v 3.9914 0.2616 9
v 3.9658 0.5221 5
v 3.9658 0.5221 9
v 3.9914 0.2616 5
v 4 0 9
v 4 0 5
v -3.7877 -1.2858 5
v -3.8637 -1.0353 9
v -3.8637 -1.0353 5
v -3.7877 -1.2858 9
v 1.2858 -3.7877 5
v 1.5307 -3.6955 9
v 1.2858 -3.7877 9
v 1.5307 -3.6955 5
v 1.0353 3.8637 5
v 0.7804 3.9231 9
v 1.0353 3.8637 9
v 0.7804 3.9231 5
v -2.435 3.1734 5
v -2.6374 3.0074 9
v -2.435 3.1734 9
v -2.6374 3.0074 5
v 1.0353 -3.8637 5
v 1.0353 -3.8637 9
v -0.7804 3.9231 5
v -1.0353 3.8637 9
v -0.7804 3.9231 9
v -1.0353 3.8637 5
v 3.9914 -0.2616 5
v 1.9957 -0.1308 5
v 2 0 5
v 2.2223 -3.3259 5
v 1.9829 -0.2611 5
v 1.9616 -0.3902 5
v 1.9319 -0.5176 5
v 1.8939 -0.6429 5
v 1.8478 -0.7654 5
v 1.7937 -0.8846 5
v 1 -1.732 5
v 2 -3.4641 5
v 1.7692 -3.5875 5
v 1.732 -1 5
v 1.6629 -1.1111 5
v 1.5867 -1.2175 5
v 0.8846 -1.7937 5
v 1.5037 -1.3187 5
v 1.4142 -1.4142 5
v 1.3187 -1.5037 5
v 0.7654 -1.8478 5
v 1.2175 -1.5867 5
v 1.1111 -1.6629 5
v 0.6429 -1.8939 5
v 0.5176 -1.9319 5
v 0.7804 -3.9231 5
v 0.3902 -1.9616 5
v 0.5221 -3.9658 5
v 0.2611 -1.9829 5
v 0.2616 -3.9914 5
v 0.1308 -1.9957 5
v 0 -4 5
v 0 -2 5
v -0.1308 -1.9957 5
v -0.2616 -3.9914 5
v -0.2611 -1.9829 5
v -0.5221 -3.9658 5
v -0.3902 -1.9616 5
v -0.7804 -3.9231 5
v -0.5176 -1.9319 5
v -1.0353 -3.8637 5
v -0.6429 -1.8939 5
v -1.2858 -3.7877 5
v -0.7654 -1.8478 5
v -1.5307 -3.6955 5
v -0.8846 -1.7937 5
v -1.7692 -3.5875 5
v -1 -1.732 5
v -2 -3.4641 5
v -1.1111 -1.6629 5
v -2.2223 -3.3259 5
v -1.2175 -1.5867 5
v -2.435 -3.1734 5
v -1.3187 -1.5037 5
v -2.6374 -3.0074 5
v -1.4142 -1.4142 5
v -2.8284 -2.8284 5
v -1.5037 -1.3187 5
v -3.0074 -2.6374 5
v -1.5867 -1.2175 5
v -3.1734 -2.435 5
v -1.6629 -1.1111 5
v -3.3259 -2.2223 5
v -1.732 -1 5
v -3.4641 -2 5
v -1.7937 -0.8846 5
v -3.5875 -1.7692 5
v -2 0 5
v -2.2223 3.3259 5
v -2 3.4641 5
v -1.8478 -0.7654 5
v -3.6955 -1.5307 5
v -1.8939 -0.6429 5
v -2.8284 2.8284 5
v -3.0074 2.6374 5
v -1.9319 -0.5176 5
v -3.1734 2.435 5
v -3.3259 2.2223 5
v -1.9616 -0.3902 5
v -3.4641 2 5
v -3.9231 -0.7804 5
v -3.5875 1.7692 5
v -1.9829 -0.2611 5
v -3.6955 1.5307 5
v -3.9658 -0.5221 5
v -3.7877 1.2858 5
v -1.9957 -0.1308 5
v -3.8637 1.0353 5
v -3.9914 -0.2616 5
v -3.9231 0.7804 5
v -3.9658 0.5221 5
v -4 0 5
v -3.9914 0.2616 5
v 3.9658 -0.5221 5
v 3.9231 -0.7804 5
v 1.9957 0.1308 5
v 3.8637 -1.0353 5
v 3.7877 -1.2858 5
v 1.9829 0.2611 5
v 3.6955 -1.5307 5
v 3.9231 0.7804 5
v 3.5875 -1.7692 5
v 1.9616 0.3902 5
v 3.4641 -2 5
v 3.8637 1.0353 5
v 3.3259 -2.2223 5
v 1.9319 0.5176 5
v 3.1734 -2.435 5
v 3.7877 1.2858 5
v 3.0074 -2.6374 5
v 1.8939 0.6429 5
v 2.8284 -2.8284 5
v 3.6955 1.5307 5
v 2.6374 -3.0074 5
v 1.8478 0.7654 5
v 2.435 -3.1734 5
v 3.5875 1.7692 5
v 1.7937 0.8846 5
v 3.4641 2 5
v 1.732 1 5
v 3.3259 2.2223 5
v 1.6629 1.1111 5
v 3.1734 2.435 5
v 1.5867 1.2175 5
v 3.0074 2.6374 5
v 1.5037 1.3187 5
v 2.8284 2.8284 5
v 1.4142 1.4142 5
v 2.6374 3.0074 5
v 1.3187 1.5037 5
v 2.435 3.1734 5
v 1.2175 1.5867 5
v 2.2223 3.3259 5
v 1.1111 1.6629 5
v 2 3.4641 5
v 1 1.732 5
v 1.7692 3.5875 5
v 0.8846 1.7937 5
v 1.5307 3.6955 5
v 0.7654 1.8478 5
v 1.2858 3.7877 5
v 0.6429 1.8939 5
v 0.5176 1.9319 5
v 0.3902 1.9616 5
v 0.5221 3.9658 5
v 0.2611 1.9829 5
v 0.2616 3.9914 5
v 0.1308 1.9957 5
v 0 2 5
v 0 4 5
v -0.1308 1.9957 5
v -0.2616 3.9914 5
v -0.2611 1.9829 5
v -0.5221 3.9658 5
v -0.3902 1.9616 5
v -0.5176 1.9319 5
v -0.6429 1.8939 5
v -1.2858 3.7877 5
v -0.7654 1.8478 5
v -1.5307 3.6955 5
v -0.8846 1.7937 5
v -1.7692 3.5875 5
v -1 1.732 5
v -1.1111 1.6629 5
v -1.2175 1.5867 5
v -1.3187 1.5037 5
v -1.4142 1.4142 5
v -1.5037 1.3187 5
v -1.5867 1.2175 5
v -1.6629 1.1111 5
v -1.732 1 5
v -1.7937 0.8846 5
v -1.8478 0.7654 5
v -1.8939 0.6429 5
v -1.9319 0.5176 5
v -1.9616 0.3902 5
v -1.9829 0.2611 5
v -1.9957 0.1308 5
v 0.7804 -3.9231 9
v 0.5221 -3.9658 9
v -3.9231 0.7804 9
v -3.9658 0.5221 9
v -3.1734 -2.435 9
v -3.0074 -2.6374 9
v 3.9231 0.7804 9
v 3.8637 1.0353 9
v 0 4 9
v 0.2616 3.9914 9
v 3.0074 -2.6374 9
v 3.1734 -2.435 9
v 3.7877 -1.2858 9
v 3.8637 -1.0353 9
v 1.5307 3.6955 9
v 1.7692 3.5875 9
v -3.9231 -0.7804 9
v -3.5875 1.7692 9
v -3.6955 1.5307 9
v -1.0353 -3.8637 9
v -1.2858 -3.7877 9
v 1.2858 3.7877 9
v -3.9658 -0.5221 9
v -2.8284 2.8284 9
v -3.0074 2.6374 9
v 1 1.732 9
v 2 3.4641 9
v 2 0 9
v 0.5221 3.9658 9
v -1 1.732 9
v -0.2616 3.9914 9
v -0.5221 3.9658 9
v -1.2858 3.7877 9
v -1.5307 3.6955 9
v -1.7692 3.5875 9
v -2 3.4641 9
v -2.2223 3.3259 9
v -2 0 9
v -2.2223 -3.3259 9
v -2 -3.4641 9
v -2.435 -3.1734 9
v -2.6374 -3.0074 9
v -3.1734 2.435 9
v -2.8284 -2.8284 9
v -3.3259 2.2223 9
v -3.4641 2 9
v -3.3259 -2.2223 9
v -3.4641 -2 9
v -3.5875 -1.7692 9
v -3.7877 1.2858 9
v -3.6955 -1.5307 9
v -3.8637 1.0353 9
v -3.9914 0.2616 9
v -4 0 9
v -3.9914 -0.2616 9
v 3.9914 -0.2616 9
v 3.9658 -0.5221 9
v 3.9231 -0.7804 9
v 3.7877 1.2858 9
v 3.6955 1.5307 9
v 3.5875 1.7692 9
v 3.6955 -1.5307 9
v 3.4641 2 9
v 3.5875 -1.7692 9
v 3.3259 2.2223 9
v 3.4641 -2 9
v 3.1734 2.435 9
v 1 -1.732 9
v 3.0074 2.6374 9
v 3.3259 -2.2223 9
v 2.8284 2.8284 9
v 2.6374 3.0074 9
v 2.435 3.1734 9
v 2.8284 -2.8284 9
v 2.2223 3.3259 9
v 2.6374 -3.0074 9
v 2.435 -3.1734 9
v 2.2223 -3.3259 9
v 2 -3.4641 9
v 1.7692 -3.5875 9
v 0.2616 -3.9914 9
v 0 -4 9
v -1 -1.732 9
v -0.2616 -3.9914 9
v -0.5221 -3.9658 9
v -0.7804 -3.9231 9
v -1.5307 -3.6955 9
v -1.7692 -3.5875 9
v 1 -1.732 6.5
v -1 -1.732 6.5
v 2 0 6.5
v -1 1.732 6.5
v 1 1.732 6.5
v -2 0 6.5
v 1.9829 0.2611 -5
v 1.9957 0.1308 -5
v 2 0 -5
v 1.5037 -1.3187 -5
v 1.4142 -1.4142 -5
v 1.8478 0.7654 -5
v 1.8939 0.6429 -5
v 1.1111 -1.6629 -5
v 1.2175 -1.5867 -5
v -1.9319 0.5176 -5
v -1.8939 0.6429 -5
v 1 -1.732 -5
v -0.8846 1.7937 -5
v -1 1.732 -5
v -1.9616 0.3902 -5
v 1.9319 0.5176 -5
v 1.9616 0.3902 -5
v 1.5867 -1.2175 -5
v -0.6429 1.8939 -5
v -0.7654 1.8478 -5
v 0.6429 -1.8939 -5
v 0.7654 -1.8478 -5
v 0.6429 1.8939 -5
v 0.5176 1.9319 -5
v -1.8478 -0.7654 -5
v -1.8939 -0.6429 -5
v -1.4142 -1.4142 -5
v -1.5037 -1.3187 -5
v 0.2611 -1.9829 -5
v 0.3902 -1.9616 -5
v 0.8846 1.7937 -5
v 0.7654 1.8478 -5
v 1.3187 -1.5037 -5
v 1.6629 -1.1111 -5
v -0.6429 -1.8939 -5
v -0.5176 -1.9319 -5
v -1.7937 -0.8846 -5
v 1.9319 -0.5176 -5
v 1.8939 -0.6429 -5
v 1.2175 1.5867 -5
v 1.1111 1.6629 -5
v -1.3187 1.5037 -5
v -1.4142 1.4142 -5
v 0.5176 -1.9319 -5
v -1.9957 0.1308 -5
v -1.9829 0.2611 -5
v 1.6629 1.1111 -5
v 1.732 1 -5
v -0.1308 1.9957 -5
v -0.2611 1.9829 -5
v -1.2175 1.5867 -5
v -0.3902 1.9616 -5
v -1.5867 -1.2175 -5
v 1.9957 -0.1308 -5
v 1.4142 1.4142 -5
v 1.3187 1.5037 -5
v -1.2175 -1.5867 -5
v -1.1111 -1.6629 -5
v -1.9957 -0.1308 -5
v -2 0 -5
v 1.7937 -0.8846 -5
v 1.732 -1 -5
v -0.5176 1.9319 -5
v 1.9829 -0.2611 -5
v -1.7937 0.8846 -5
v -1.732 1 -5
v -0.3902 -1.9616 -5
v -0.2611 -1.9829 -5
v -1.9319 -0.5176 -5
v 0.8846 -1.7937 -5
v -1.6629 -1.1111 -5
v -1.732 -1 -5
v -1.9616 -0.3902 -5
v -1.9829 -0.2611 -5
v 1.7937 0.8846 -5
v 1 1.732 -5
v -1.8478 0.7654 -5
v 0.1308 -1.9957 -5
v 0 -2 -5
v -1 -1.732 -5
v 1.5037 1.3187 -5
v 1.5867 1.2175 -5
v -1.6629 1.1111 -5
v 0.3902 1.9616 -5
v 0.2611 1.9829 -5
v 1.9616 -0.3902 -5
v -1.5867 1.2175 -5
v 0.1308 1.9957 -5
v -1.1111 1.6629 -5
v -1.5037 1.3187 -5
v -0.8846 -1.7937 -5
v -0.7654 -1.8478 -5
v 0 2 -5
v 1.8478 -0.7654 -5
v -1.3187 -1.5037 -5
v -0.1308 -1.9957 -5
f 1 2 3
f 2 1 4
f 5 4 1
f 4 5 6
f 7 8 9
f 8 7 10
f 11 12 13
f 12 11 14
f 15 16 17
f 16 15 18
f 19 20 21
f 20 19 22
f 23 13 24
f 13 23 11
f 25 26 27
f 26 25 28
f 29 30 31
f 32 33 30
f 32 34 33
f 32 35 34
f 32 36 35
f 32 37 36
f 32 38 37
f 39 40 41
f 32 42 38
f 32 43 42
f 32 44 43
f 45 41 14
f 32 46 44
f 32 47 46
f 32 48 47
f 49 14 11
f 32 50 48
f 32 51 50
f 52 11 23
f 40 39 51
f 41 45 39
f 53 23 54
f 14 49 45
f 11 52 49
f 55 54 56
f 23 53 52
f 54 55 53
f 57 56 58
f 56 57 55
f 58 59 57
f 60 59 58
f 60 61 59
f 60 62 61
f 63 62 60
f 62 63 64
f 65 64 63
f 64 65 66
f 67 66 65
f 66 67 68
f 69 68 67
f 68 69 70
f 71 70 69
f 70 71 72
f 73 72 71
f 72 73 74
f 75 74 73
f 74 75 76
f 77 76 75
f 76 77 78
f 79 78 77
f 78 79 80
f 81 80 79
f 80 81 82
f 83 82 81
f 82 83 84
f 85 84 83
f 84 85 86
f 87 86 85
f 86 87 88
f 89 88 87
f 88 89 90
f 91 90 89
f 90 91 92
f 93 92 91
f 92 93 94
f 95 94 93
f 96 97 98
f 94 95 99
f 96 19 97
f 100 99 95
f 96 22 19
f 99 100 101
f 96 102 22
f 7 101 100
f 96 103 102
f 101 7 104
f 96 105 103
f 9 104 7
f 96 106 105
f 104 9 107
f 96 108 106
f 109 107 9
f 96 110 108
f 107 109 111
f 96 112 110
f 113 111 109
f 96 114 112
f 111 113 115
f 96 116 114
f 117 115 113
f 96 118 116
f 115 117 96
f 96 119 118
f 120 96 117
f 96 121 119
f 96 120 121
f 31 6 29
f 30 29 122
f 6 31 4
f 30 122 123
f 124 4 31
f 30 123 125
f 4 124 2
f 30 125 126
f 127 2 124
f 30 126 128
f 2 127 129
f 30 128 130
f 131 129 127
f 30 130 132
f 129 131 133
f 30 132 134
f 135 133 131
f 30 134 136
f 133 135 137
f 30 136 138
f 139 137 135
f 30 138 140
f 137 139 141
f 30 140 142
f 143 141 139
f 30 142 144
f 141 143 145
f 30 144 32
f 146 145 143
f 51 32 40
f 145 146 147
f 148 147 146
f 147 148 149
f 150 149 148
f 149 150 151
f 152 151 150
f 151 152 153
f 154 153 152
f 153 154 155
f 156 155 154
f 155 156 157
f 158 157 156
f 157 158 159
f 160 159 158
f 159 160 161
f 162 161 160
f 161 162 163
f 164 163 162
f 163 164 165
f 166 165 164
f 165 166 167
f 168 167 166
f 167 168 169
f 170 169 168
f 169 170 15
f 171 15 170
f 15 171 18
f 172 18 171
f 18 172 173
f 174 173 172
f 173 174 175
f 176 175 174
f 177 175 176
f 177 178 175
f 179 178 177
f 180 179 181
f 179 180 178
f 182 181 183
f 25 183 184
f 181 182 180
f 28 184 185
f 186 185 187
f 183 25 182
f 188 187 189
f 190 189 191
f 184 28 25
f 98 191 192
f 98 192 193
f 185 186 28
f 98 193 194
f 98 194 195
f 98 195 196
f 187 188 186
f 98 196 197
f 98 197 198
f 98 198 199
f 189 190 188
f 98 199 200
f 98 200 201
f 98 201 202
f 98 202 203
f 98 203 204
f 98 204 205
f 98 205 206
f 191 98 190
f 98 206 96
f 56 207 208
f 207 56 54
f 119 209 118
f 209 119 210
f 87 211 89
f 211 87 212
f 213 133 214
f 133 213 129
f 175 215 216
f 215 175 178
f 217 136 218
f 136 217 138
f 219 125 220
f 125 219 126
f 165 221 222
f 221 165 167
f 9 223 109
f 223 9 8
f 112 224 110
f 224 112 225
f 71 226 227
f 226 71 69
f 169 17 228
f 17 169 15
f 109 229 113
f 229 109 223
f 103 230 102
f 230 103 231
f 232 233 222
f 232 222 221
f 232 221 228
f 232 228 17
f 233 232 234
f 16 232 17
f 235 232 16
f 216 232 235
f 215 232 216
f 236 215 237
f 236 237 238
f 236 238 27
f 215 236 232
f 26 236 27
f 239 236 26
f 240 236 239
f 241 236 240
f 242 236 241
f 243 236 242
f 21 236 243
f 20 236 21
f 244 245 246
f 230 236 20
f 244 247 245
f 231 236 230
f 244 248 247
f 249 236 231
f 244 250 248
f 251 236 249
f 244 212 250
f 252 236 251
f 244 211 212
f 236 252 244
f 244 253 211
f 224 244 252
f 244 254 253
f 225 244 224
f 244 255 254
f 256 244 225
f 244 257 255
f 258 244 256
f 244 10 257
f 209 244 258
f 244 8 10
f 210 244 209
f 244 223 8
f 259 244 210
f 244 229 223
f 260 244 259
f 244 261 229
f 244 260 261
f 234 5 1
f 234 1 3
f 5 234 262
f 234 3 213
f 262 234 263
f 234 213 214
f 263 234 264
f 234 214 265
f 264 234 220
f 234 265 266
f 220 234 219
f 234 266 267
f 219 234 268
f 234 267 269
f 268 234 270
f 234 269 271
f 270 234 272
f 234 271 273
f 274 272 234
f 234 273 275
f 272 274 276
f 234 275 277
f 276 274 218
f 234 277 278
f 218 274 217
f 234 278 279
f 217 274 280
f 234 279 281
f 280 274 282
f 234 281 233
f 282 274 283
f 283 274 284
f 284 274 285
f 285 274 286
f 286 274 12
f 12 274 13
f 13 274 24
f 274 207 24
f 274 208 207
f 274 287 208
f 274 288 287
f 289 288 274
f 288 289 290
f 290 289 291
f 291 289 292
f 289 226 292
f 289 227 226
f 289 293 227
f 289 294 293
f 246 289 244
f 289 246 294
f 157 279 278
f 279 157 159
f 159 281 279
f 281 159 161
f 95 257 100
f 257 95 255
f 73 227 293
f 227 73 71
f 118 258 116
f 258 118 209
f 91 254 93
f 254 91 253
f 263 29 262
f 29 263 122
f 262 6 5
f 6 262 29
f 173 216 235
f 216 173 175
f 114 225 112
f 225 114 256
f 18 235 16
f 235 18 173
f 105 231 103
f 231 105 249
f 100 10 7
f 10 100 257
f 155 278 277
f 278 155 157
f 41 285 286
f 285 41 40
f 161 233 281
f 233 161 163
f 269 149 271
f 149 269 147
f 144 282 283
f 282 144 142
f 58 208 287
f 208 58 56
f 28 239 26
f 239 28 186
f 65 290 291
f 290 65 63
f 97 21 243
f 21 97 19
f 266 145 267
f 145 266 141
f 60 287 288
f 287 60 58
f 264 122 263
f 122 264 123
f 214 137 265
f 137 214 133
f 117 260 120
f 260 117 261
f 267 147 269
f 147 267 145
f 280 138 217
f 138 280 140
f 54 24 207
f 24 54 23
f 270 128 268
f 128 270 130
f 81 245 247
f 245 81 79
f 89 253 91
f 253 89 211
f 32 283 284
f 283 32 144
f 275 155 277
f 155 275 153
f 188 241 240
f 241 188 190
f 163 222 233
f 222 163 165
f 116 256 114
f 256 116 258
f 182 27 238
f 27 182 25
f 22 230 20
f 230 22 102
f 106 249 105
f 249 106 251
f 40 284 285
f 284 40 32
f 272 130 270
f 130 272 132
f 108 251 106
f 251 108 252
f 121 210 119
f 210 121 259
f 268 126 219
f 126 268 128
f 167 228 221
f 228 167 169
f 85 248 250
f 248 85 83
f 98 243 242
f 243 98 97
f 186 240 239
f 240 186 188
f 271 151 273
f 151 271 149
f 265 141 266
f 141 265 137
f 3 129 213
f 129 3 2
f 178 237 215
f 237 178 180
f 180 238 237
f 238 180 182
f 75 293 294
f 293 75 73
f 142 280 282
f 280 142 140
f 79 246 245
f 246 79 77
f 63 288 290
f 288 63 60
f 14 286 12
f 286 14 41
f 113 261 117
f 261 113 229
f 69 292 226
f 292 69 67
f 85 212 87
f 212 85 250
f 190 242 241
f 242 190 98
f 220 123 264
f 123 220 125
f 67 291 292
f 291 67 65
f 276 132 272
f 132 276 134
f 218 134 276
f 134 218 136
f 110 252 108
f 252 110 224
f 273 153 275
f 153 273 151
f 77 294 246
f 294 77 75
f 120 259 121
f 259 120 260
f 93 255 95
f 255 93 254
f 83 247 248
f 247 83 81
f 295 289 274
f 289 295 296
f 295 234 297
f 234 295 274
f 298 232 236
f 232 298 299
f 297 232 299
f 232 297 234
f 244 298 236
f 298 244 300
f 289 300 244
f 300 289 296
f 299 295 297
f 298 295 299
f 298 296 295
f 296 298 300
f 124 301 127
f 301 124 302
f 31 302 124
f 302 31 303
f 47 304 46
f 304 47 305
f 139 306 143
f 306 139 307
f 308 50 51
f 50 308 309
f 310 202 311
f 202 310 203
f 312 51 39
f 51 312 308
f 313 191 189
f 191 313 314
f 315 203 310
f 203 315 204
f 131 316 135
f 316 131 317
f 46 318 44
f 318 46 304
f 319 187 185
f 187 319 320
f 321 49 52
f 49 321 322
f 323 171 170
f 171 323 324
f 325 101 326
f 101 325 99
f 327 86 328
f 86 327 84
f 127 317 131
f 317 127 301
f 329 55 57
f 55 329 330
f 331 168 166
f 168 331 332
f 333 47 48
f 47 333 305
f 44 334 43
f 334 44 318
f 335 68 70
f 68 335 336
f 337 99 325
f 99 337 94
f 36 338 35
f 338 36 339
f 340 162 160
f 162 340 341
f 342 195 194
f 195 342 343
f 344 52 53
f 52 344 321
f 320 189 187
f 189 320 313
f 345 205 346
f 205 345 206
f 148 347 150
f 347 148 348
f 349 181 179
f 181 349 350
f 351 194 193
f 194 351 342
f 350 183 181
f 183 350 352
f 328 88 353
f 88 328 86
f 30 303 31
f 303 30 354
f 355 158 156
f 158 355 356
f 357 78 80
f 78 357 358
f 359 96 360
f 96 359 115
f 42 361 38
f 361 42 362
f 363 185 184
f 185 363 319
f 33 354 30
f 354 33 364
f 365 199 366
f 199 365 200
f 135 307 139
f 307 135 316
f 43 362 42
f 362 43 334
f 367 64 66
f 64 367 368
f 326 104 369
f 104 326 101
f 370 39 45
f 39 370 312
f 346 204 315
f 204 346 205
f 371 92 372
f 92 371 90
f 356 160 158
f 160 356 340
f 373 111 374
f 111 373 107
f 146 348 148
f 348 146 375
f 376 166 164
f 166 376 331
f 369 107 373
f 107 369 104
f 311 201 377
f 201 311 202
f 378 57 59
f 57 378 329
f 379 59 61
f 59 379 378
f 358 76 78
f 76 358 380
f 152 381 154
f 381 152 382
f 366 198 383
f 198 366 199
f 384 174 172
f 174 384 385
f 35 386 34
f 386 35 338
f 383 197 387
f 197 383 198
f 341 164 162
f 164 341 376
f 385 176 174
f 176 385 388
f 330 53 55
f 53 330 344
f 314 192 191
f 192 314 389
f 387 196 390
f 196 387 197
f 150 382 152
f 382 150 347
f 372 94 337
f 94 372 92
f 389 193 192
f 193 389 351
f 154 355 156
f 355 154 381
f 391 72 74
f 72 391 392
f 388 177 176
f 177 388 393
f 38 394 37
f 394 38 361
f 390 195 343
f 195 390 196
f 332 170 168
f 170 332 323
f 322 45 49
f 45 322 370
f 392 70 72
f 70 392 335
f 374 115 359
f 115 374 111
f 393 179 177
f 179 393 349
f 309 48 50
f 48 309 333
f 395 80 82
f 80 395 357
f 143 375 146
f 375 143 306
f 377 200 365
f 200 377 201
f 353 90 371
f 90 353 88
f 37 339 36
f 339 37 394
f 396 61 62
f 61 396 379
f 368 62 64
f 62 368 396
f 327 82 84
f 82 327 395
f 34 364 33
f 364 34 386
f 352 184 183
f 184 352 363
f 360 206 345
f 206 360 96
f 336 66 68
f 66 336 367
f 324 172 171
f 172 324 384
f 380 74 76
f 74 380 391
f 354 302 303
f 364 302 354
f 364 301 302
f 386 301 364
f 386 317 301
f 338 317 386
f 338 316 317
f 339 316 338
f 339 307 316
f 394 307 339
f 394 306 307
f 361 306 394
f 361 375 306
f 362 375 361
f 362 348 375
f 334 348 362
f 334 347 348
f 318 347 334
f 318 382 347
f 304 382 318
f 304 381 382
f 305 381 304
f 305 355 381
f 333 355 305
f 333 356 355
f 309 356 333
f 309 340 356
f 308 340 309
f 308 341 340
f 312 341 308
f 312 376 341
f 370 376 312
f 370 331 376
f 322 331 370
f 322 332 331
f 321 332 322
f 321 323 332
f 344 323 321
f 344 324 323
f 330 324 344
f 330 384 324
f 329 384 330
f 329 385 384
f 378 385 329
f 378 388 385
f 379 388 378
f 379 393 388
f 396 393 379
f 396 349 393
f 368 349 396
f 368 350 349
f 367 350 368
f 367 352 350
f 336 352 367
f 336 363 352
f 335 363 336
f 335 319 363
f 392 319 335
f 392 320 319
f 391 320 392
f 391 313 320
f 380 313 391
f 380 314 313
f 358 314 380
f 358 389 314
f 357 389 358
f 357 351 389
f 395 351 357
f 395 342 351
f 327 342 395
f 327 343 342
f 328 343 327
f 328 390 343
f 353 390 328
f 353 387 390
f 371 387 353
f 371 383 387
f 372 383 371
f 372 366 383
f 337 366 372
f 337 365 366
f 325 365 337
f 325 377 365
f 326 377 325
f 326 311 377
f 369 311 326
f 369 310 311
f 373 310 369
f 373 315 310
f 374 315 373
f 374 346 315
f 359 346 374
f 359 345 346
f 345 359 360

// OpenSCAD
$fn=96;

module socket_head_cap_screw(d=4.0, head_d=8.0, length=10.0, head_h=4.0, socket_d=4.0, socket_depth=2.5) {
    union() {
        translate([0,0,-length/2])
            cylinder(d=d, h=length, $fn=96);

        translate([0,0,length/2])
            difference() {
                cylinder(d=head_d, h=head_h, $fn=96);
                translate([0,0,head_h - socket_depth])
                    cylinder(d=socket_d, h=socket_depth + 0.2, $fn=6);
            }
    }
}

socket_head_cap_screw(d=4.0, head_d=8.0, length=10.0, head_h=4.0, socket_d=4.0, socket_depth=2.5);
